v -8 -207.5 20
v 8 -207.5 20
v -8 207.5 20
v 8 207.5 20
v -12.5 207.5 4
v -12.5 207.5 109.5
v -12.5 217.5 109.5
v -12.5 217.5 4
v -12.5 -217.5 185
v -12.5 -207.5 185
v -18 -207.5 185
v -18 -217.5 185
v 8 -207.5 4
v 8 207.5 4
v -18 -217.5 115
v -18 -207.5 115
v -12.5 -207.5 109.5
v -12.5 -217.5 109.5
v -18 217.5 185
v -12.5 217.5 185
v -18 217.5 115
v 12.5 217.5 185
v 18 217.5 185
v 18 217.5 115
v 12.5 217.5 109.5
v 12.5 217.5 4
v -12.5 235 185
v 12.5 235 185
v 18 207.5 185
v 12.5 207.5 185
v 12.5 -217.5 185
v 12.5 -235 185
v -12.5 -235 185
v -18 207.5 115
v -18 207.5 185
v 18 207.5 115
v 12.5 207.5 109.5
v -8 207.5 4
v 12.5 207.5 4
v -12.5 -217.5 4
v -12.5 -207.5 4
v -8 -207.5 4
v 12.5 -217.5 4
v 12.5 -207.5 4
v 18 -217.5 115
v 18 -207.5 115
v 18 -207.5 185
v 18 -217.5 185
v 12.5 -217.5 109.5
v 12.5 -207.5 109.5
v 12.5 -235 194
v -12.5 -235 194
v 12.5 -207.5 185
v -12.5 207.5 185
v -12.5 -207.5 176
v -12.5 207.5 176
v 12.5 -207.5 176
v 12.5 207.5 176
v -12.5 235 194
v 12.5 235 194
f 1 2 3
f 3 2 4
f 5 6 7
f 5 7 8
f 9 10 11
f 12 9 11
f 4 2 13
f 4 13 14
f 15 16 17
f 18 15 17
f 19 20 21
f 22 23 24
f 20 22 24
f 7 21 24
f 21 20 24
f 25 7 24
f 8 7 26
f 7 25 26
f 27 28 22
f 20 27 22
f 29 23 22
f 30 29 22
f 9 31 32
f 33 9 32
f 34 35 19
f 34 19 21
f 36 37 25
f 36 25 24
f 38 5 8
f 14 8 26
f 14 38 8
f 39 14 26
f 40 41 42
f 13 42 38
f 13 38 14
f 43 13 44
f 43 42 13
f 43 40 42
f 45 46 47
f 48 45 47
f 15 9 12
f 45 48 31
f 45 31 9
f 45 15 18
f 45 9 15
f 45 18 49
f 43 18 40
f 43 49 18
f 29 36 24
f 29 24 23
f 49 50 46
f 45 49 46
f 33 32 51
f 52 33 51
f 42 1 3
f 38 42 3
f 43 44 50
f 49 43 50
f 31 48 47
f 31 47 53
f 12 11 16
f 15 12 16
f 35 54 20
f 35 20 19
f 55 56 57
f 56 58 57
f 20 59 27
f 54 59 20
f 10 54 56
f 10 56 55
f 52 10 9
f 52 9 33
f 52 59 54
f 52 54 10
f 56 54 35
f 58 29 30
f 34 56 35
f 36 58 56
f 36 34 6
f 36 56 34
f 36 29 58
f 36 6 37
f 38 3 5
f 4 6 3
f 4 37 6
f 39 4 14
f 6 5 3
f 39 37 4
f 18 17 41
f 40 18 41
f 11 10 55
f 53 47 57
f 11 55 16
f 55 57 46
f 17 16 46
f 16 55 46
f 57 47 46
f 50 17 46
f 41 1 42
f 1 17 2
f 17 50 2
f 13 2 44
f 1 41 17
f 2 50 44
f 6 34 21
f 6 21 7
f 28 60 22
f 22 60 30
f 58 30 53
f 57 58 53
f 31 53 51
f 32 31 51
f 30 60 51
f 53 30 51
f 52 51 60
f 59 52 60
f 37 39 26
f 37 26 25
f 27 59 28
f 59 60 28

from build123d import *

# Parameters (mm, degrees)
PAD005_DEPTH = 12.5
PAD006_DEPTH = 10
PAD007_DEPTH = 10
SKETCH012_W  = 415
SKETCH012_H  = 16
PAD008_DEPTH = 8


with BuildPart() as part:
    # Sketch008 → Pad005 (new body, symmetric)
    with BuildSketch(Plane.YZ):
        Polygon((-235, 194), (235, 194), (235, 185), (207.5, 185), (207.5, 176), (-207.5, 176), (-207.5, 185), (-235, 185), align=None)
    extrude(amount=PAD005_DEPTH, both=True)

    # Sketch010 (on Face6 of Pad005) → Pad006 (join)
    with BuildSketch(Plane(origin=(0, -207.5, 0), x_dir=(0, 0, -1), z_dir=(0, -1, 0))):
        Polygon((-185, 18), (-185, -18), (-115, -18), (-109.5, -12.5), (-4, -12.5), (-4, 12.5), (-109.5, 12.5), (-115, 18), align=None)
    extrude(amount=PAD006_DEPTH)

    # Sketch011 (on Face8 of Pad006) → Pad007 (join)
    with BuildSketch(Plane.ZX.offset(207.5)):
        Polygon((4, 12.5), (109.5, 12.5), (115, 18), (185, 18), (185, -18), (115, -18), (109.5, -12.5), (4, -12.5), align=None)
    extrude(amount=PAD007_DEPTH)

    # Sketch012 → Pad008 (join, symmetric)
    with BuildSketch(Plane.YZ):
        with Locations((0, 12)):
            Rectangle(SKETCH012_W, SKETCH012_H)
    extrude(amount=PAD008_DEPTH, both=True)


solid = part.part
